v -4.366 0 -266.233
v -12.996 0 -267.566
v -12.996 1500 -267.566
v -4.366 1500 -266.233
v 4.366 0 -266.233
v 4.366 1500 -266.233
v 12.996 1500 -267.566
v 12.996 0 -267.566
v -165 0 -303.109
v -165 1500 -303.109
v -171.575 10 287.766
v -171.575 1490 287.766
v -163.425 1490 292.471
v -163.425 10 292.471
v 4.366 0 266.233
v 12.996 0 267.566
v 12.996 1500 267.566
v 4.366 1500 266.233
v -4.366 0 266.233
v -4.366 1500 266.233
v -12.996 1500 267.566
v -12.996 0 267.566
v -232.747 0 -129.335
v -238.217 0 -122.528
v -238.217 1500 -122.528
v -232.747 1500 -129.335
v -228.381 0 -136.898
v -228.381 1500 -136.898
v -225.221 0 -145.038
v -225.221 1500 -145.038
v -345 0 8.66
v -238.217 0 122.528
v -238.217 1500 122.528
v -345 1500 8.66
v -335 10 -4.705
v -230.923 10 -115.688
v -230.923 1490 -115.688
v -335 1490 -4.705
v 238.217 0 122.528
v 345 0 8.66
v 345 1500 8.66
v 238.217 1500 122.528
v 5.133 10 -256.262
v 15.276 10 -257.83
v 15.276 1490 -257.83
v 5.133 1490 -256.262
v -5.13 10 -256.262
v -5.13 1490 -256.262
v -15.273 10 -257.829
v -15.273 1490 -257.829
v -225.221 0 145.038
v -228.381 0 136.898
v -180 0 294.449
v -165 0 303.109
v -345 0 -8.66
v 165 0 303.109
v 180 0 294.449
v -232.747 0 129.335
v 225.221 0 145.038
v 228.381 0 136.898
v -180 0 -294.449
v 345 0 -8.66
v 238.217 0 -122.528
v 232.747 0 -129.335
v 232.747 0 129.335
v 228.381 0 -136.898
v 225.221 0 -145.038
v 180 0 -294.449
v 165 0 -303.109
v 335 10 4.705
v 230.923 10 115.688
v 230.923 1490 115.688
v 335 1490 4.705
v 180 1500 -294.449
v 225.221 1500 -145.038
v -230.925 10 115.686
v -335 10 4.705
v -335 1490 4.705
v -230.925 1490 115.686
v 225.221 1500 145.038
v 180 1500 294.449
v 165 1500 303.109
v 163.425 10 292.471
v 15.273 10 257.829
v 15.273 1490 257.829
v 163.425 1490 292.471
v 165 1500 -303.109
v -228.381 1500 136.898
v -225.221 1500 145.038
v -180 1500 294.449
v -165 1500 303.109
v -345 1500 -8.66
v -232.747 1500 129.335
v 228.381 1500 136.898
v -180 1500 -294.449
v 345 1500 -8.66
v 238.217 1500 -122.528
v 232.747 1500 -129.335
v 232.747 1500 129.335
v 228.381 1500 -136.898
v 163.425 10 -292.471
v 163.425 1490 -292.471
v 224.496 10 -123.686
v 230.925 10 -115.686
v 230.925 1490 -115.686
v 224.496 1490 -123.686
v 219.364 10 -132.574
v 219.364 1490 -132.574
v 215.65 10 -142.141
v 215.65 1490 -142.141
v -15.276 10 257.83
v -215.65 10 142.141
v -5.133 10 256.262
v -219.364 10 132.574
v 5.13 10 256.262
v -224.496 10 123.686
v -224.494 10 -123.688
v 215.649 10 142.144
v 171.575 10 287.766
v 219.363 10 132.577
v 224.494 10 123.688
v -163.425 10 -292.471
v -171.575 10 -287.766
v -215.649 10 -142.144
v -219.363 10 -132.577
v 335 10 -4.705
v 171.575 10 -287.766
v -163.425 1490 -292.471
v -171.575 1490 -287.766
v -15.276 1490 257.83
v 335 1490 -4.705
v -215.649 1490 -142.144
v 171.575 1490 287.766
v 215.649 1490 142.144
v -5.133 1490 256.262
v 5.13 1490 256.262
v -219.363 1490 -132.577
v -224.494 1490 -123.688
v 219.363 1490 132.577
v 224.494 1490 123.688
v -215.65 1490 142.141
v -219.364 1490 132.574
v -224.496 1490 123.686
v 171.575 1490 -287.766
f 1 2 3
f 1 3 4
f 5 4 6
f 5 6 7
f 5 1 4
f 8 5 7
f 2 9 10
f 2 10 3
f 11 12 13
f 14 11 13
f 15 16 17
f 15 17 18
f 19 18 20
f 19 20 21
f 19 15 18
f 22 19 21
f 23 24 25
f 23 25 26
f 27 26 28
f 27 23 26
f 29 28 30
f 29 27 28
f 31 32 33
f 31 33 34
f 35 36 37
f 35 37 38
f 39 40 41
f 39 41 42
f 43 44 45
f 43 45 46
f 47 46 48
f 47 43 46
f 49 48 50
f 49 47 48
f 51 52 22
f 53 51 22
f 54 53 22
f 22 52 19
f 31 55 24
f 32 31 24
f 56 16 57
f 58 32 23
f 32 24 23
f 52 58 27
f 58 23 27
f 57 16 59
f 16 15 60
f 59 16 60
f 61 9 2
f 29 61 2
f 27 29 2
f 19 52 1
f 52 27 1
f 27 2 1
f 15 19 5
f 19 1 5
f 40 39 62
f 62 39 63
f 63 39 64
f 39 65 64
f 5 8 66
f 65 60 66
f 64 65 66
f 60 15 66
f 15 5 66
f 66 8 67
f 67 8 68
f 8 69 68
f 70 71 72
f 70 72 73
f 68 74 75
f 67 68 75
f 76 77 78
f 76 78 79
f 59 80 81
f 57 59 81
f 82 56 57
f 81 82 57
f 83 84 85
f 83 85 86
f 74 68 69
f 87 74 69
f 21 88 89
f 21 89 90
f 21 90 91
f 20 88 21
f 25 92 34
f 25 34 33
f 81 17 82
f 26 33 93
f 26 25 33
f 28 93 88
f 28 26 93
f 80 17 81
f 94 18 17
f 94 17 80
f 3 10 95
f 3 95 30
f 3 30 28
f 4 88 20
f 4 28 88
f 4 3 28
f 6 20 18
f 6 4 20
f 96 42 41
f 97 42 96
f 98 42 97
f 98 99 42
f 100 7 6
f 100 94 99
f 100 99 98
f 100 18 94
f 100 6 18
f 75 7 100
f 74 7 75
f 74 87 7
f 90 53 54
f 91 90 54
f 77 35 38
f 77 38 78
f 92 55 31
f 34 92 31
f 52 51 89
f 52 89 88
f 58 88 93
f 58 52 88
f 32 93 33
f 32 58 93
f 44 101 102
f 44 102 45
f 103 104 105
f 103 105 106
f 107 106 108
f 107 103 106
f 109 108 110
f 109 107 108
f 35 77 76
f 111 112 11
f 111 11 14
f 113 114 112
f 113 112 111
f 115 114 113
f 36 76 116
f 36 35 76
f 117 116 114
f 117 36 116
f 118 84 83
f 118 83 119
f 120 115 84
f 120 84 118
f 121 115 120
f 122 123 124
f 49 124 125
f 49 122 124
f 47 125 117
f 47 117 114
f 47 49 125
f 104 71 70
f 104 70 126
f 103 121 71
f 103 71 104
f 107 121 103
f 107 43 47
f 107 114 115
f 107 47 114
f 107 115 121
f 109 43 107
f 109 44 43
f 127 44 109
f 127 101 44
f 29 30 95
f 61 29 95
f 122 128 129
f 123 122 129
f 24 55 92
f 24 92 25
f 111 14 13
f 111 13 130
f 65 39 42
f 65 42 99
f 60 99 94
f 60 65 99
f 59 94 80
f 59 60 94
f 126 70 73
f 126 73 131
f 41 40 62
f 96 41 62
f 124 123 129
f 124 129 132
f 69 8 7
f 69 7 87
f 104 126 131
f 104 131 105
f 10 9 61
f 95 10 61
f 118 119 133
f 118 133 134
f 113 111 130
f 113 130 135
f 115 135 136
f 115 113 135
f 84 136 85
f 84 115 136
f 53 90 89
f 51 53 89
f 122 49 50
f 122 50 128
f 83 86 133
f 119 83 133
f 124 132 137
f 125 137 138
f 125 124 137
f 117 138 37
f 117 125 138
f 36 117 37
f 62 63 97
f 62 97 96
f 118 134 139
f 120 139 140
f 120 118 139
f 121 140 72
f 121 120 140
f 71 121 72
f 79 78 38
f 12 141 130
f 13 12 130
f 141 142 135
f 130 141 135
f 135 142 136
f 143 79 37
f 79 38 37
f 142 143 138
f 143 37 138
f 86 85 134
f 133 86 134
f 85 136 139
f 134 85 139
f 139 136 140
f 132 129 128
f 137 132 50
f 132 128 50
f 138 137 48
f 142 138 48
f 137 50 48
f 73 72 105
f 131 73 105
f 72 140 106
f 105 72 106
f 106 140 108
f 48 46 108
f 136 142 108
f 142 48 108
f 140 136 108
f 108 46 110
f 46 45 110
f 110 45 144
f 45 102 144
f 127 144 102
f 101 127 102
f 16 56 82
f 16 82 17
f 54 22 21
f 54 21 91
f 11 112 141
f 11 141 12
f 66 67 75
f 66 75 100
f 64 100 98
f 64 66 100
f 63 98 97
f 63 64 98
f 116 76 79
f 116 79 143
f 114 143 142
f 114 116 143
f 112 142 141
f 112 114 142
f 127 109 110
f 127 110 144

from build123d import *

# Parameters (mm, degrees)
EXTRUDE_1_DEPTH     = 1500
CUT_EXTRUDE_4_DEPTH = 1500
SHELL_START         = 10
SHELL_3_DEPTH       = 1480


# Read off the part's stored shape, not the designer's step: 抽壳3
with BuildPart() as part:
    # 草图2 → 凸台-拉伸1 (new body)
    with BuildSketch(Plane(origin=(0, 0, 0), x_dir=(1, 0, 0), z_dir=(0, 1, 0))):
        Polygon((345, 8.660254038), (180, 294.448637287), (165, 303.108891325), (-165, 303.108891325), (-180, 294.448637287), (-345, 8.660254038), (-345, -8.660254038), (-180, -294.448637287), (-165, -303.108891325), (165, -303.108891325), (180, -294.448637287), (345, -8.660254038), align=None)
    extrude(amount=EXTRUDE_1_DEPTH)

    # 草图5 → 切除-拉伸4 (cut)
    with BuildSketch(Plane(origin=(0, 0, 0), x_dir=(1, 0, 0), z_dir=(0, 1, 0))):
        with BuildLine():
            Line((238.21737139, 122.528375301), (345, 8.660254038))
            Line((345, 8.660254038), (379.520233023, 28.590519866))
            Line((379.520233023, 28.590519866), (334.34391274, 178.027059826))
            ThreePointArc((334.34391274, 178.027059826), (329.146090081, 190.032583711), (321.34791274, 200.536792121))
            Line((321.34791274, 200.536792121), (214.969297582, 314.638170659))
            Line((214.969297582, 314.638170659), (180, 294.448637287))
            Line((180, 294.448637287), (225.22137139, 145.038107596))
            ThreePointArc((225.22137139, 145.038107596), (230.419194049, 133.032583711), (238.21737139, 122.528375301))
        make_face()
        with BuildLine():
            Line((225.22137139, -145.038107596), (180, -294.448637287))
            Line((180, -294.448637287), (214.520233023, -314.378903115))
            Line((214.520233023, -314.378903115), (321.34791274, -200.536792121))
            ThreePointArc((321.34791274, -200.536792121), (329.146090081, -190.032583711), (334.34391274, -178.027059826))
            Line((334.34391274, -178.027059826), (379.969297582, -28.84978741))
            Line((379.969297582, -28.84978741), (345, -8.660254038))
            Line((345, -8.660254038), (238.21737139, -122.528375301))
            ThreePointArc((238.21737139, -122.528375301), (230.419194049, -133.032583711), (225.22137139, -145.038107596))
        make_face()
        with BuildLine():
            Line((12.996, 267.566482896), (165, 303.108891325))
            Line((165, 303.108891325), (165, 342.969422981))
            Line((165, 342.969422981), (12.996, 378.563851946))
            ThreePointArc((12.996, 378.563851946), (0, 380.065167421), (-12.996, 378.563851946))
            Line((-12.996, 378.563851946), (-165, 343.487958069))
            Line((-165, 343.487958069), (-165, 303.108891325))
            Line((-165, 303.108891325), (-12.996, 267.566482896))
            ThreePointArc((-12.996, 267.566482896), (0, 266.065167421), (12.996, 267.566482896))
        make_face()
        with BuildLine():
            Line((-12.996, -267.566482896), (-165, -303.108891325))
            Line((-165, -303.108891325), (-165, -342.969422981))
            Line((-165, -342.969422981), (-12.996, -378.563851946))
            ThreePointArc((-12.996, -378.563851946), (0, -380.065167421), (12.996, -378.563851946))
            Line((12.996, -378.563851946), (165, -343.487958069))
            Line((165, -343.487958069), (165, -303.108891325))
            Line((165, -303.108891325), (12.996, -267.566482896))
            ThreePointArc((12.996, -267.566482896), (0, -266.065167421), (-12.996, -267.566482896))
        make_face()
        with BuildLine():
            Line((-238.21737139, -122.528375301), (-345, -8.660254038))
            Line((-345, -8.660254038), (-379.520233023, -28.590519866))
            Line((-379.520233023, -28.590519866), (-334.34391274, -178.027059826))
            ThreePointArc((-334.34391274, -178.027059826), (-329.146090081, -190.032583711), (-321.34791274, -200.536792121))
            Line((-321.34791274, -200.536792121), (-214.969297582, -314.638170659))
            Line((-214.969297582, -314.638170659), (-180, -294.448637287))
            Line((-180, -294.448637287), (-225.22137139, -145.038107596))
            ThreePointArc((-225.22137139, -145.038107596), (-230.419194049, -133.032583711), (-238.21737139, -122.528375301))
        make_face()
        with BuildLine():
            Line((-225.22137139, 145.038107596), (-180, 294.448637287))
            Line((-180, 294.448637287), (-214.520233023, 314.378903115))
            Line((-214.520233023, 314.378903115), (-321.34791274, 200.536792121))
            ThreePointArc((-321.34791274, 200.536792121), (-329.14609008, 190.032583711), (-334.34391274, 178.027059826))
            Line((-334.34391274, 178.027059826), (-379.969297582, 28.84978741))
            Line((-379.969297582, 28.84978741), (-345, 8.660254038))
            Line((-345, 8.660254038), (-238.21737139, 122.528375301))
            ThreePointArc((-238.21737139, 122.528375301), (-230.419194049, 133.032583711), (-225.22137139, 145.038107596))
        make_face()
    extrude(amount=CUT_EXTRUDE_4_DEPTH, mode=Mode.SUBTRACT)

    # 抽壳3 outline → 抽壳3 (cut)
    with BuildSketch(Plane(origin=(0, 0, 0), x_dir=(1, 0, 0), z_dir=(0, 1, 0)).offset(SHELL_START)):
        with BuildLine():
            Line((-163.425407286, 292.470977468), (-171.574592714, 287.766043068))
            Line((-171.574592714, 287.766043068), (-215.64921864, 142.144339856))
            ThreePointArc((-215.64921864, 142.144339856), (-221.758128865, 128.033988697), (-230.922998431, 115.687897825))
            Line((-230.922998431, 115.687897825), (-335, 4.7049344))
            Line((-335, 4.7049344), (-335, -4.7049344))
            Line((-335, -4.7049344), (-230.92521864, -115.68553172))
            ThreePointArc((-230.92521864, -115.68553172), (-221.759751192, -128.031178744), (-215.650157642, -142.141234046))
            Line((-215.650157642, -142.141234046), (-171.574592714, -287.766043068))
            Line((-171.574592714, -287.766043068), (-163.425407286, -292.470977468))
            Line((-163.425407286, -292.470977468), (-15.276, -257.829871576))
            ThreePointArc((-15.276, -257.829871576), (-0.001622327, -256.065167441), (15.272840788, -257.829131872))
            Line((15.272840788, -257.829131872), (163.425407286, -292.470977468))
            Line((163.425407286, -292.470977468), (171.574592714, -287.766043068))
            Line((171.574592714, -287.766043068), (215.64921864, -142.144339856))
            ThreePointArc((215.64921864, -142.144339856), (221.758128865, -128.033988697), (230.922998431, -115.687897825))
            Line((230.922998431, -115.687897825), (335, -4.704934401))
            Line((335, -4.704934401), (335, 4.7049344))
            Line((335, 4.7049344), (230.92521864, 115.68553172))
            ThreePointArc((230.92521864, 115.68553172), (221.759751192, 128.031178744), (215.650157642, 142.141234046))
            Line((215.650157642, 142.141234046), (171.574592714, 287.766043068))
            Line((171.574592714, 287.766043068), (163.425407286, 292.470977468))
            Line((163.425407286, 292.470977468), (15.276, 257.829871576))
            ThreePointArc((15.276, 257.829871576), (0.001622327, 256.065167441), (-15.272840788, 257.829131872))
            Line((-15.272840788, 257.829131872), (-163.425407286, 292.470977468))
        make_face()
    extrude(amount=SHELL_3_DEPTH, mode=Mode.SUBTRACT)


solid = part.part
